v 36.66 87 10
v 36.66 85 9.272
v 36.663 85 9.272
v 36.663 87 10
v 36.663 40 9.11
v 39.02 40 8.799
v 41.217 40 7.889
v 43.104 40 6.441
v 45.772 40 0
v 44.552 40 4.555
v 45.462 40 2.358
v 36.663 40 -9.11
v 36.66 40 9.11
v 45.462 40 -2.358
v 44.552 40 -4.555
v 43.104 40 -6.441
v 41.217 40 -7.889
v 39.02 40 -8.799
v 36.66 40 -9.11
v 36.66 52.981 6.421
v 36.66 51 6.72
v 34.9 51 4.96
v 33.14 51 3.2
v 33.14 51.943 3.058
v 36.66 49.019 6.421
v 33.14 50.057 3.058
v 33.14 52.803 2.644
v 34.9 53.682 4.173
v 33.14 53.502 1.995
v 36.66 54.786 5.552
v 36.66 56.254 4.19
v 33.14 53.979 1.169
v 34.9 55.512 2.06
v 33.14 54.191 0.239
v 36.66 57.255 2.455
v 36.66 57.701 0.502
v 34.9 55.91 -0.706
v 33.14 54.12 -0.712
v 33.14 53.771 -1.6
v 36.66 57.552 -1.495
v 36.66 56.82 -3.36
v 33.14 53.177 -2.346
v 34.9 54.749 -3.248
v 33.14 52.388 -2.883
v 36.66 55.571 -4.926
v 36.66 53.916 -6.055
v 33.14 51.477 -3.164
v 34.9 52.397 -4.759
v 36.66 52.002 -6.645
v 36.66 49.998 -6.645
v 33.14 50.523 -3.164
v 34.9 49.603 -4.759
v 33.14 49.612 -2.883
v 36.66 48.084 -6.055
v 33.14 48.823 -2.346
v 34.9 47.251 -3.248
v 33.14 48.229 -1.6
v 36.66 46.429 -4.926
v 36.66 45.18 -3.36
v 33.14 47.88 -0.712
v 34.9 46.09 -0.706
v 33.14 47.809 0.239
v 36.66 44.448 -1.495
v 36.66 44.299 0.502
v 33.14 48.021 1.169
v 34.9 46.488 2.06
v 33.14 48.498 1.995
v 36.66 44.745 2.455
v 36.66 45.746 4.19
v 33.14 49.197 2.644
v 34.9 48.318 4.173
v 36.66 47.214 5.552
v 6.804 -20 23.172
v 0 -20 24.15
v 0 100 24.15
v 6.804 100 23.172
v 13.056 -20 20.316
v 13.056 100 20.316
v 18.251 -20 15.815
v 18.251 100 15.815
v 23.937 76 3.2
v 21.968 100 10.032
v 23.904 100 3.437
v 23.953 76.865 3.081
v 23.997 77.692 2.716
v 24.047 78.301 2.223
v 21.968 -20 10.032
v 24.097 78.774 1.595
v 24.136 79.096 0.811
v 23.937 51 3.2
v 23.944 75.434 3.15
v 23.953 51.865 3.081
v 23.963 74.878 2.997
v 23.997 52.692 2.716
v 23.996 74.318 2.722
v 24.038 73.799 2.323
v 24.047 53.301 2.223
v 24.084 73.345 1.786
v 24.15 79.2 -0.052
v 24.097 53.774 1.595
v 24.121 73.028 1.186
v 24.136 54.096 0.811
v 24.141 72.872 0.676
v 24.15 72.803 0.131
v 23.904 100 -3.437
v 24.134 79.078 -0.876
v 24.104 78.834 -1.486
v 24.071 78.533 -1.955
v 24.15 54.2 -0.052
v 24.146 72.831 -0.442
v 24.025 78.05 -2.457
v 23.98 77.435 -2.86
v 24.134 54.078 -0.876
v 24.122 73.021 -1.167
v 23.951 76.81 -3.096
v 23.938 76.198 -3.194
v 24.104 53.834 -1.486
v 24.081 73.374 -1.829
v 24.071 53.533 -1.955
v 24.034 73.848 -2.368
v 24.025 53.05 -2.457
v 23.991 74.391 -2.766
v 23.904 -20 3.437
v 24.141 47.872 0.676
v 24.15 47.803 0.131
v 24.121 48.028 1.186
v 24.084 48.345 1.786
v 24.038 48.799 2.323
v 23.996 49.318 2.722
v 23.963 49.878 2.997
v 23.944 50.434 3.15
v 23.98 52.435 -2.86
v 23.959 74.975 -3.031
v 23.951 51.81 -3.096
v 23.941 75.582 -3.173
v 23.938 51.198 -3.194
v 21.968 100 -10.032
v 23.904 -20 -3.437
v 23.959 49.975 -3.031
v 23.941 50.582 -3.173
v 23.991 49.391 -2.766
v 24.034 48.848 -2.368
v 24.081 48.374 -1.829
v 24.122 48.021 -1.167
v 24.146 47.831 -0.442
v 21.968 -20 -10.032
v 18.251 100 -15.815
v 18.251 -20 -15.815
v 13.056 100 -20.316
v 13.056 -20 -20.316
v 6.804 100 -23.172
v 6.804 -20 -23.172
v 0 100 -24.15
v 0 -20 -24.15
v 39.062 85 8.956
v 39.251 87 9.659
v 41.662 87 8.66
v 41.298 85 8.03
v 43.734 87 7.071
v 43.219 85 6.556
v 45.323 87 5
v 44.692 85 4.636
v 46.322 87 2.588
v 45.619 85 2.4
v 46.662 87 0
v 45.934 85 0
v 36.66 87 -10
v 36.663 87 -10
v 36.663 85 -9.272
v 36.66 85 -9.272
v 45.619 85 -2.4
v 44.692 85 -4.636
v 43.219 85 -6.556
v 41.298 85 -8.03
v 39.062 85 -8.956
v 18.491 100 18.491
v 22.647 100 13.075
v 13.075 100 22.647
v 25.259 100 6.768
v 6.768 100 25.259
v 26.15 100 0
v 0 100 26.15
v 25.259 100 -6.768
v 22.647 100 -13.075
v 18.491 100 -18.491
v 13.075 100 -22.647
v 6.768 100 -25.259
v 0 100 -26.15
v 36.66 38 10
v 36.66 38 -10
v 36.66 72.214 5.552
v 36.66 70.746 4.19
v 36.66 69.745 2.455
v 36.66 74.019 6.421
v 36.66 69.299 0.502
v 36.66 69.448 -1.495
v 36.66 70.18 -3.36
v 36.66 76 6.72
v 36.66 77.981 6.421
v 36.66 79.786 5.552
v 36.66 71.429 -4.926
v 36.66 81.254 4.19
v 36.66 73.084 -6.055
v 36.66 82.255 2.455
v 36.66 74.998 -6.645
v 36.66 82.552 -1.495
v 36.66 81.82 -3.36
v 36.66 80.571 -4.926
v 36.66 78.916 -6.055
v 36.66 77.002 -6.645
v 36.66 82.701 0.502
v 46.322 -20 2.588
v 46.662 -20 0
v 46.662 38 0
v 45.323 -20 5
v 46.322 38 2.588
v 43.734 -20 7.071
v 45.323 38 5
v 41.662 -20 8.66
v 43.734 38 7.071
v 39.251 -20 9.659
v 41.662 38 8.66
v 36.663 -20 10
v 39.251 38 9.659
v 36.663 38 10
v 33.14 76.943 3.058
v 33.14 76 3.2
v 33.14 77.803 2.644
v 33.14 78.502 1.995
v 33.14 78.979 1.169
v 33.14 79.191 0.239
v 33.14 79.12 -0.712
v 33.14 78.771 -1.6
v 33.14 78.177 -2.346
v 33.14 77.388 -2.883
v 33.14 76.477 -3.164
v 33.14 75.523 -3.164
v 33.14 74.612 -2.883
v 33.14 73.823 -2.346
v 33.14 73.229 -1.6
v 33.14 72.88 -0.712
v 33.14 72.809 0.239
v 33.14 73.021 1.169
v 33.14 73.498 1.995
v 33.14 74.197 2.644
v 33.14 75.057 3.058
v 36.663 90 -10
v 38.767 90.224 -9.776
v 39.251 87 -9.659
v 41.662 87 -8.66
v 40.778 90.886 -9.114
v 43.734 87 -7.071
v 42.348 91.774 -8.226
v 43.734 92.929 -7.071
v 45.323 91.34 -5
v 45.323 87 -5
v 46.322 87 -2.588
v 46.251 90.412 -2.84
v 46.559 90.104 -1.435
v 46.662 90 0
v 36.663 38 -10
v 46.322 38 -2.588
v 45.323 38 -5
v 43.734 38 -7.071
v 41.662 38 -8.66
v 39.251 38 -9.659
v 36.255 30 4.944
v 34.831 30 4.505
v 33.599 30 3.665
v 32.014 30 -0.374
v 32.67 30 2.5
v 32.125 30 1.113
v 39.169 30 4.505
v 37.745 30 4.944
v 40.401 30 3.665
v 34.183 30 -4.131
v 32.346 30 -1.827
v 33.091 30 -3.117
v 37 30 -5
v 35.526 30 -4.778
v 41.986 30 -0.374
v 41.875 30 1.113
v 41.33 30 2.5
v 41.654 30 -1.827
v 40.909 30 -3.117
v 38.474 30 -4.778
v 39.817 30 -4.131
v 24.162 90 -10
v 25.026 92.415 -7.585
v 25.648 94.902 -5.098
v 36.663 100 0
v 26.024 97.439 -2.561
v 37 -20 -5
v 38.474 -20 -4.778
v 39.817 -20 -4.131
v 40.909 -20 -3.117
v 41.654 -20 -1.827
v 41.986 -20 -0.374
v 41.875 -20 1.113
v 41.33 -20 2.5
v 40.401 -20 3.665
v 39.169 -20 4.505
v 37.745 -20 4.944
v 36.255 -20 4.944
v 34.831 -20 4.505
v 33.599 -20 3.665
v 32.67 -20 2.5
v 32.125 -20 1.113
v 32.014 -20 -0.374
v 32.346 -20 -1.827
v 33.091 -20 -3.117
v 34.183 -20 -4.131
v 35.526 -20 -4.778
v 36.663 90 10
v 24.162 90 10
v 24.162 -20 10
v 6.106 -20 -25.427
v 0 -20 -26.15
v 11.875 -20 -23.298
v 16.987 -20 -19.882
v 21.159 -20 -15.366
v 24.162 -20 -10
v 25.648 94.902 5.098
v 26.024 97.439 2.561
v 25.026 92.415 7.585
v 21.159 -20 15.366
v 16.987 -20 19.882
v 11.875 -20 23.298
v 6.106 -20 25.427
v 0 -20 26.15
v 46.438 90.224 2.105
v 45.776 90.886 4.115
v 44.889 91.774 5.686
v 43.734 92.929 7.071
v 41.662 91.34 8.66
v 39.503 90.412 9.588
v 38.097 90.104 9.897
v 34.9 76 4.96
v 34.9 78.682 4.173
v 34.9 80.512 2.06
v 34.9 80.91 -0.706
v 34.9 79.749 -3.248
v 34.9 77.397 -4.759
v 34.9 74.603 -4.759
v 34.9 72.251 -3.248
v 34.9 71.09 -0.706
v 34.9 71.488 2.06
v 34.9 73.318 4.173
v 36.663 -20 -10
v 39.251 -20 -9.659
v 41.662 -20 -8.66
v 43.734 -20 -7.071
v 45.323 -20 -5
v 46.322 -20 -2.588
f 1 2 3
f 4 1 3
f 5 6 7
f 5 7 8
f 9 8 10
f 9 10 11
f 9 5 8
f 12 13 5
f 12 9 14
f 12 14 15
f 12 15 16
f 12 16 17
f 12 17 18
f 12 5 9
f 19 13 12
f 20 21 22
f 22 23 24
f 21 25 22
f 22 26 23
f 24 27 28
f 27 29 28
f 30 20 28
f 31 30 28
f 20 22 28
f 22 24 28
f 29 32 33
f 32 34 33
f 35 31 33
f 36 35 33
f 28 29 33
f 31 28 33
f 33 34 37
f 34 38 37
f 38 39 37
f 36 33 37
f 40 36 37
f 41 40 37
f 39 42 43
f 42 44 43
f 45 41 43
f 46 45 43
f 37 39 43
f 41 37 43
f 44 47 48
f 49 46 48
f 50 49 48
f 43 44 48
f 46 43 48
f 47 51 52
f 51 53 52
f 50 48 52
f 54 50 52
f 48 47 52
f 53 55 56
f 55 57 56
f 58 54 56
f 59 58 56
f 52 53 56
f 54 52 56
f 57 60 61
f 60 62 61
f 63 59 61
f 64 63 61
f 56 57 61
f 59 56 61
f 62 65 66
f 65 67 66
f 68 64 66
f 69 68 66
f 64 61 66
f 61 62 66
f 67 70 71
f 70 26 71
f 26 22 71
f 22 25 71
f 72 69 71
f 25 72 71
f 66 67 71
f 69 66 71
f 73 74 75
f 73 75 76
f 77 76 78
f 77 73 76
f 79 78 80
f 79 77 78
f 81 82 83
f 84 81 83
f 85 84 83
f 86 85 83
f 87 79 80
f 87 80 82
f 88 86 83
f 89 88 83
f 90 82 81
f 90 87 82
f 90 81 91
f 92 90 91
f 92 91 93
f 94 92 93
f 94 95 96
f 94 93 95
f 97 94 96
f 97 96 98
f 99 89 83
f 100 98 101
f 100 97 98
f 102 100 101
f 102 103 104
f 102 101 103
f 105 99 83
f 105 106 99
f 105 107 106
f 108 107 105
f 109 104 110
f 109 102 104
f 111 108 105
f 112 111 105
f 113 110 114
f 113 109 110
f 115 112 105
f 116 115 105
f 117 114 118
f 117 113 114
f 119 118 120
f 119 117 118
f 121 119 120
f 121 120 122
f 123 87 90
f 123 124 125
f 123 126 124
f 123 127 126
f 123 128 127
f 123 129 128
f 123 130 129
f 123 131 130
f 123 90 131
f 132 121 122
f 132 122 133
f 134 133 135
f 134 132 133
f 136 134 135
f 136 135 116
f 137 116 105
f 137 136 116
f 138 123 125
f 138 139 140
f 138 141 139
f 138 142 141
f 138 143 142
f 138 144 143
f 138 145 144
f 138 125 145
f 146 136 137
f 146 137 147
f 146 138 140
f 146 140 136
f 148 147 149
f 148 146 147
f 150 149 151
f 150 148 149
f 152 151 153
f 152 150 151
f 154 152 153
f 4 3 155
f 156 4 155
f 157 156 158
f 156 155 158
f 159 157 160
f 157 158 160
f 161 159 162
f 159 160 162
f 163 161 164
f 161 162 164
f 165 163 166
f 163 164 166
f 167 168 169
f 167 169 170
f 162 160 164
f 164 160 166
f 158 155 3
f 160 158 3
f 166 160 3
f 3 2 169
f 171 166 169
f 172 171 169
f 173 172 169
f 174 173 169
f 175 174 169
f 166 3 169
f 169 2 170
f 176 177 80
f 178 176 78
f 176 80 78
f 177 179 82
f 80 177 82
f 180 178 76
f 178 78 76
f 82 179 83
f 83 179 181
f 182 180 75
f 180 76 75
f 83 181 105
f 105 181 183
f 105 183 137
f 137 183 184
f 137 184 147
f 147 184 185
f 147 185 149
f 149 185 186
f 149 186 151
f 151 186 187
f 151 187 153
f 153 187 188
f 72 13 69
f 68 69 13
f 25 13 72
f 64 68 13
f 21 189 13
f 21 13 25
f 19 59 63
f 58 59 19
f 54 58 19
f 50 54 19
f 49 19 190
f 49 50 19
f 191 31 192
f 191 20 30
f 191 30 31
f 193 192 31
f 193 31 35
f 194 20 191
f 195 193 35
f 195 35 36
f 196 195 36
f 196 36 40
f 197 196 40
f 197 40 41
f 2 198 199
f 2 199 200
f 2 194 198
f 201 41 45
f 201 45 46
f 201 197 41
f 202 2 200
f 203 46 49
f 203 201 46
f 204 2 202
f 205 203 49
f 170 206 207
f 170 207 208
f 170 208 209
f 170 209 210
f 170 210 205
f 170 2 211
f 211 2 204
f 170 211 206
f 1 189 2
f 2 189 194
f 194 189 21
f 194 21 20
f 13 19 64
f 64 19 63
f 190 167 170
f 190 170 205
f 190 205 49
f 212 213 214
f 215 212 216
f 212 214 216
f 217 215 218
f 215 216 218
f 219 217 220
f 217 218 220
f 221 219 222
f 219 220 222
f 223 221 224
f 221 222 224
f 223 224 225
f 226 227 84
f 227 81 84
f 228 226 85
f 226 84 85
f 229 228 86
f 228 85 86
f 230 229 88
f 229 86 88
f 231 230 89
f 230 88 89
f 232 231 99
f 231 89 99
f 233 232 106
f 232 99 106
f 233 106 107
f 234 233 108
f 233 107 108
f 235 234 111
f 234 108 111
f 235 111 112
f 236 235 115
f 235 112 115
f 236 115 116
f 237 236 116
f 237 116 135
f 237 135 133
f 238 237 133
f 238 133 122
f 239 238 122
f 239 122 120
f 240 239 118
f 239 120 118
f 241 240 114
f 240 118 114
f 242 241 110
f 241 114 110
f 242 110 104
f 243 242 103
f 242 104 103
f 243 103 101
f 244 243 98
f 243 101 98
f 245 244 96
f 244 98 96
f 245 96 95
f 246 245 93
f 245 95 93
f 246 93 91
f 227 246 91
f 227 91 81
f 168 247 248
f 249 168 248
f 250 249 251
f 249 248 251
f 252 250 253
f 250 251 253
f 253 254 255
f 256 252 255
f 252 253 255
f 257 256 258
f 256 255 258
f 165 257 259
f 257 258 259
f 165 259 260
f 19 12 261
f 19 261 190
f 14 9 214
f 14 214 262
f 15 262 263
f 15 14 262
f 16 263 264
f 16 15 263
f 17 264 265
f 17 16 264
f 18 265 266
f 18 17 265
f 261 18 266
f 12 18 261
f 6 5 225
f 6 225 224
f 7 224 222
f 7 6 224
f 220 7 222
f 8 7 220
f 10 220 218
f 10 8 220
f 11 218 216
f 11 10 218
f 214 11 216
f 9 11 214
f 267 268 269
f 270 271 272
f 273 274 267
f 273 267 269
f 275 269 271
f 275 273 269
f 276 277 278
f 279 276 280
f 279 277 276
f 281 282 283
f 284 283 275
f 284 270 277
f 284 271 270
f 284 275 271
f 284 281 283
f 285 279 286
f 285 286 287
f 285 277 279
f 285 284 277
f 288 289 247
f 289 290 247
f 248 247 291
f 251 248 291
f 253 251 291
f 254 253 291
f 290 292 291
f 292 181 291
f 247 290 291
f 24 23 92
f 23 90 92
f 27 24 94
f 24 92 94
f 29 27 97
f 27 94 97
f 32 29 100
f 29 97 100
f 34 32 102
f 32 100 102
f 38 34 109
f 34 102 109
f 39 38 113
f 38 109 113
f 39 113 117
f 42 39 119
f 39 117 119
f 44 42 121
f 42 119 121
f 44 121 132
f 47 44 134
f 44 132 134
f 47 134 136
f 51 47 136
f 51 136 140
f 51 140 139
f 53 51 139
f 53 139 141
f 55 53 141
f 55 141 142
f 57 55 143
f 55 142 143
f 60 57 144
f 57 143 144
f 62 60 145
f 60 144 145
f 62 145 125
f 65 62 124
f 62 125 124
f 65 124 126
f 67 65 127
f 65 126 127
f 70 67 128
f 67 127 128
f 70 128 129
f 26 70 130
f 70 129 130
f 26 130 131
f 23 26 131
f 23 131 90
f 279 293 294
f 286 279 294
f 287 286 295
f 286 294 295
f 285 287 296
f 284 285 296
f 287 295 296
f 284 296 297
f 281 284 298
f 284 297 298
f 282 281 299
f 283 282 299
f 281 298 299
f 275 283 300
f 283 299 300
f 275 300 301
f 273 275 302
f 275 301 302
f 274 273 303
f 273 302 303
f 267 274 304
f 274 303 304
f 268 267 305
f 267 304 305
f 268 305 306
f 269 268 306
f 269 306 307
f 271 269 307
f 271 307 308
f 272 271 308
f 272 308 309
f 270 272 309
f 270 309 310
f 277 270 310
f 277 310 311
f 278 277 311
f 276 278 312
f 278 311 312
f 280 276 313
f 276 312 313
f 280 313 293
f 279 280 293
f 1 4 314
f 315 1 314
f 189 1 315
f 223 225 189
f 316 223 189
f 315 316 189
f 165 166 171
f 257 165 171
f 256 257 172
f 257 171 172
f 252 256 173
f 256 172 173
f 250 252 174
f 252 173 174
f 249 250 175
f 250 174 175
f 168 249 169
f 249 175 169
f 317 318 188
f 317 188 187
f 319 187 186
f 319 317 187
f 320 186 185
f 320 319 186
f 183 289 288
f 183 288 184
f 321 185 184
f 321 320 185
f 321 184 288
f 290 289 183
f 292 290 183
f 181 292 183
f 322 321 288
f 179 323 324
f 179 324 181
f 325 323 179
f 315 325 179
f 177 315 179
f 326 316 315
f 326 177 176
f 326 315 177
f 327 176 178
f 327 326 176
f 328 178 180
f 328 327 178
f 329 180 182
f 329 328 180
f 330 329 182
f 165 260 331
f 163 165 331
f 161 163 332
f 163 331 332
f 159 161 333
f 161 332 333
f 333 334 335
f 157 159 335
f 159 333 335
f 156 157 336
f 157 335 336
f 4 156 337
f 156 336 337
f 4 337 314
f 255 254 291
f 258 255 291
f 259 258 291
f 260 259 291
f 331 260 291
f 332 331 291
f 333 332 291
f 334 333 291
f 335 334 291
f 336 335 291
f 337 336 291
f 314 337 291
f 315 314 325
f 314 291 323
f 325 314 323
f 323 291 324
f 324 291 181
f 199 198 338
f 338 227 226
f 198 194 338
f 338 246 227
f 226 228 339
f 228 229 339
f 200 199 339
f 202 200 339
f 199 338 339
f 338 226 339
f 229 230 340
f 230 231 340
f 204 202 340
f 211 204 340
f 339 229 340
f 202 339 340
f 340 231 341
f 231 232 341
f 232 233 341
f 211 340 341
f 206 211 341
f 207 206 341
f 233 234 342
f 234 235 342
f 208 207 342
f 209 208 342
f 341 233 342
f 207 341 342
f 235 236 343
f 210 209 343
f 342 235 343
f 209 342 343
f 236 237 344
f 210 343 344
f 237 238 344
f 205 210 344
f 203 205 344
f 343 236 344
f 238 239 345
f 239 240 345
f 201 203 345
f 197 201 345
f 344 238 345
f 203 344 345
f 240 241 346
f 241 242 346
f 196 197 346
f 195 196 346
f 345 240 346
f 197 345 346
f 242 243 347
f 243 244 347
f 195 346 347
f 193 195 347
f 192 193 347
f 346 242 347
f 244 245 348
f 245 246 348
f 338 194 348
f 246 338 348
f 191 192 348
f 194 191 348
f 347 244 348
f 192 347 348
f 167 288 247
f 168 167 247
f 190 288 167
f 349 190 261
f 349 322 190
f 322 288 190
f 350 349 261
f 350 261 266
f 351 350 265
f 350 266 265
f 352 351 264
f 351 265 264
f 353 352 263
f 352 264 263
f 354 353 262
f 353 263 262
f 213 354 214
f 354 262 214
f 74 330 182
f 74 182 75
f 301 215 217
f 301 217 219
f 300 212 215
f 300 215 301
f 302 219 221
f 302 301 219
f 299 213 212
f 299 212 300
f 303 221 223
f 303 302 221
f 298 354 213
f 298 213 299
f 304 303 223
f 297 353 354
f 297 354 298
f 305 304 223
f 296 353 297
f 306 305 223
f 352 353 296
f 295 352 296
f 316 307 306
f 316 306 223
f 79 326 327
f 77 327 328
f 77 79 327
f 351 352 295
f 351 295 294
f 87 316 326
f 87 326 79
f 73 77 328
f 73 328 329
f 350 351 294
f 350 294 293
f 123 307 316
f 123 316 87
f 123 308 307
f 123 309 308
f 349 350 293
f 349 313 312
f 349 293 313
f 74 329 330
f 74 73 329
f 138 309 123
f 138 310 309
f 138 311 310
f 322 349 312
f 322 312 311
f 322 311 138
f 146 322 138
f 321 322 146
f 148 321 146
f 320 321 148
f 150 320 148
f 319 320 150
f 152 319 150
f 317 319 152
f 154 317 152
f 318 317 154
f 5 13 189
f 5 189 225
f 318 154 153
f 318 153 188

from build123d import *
from OCP.BRepFilletAPI import BRepFilletAPI_MakeChamfer

# Parameters (mm, degrees)
DODANIE_WYCI_GNI_CIE1_DEPTH                        = 100
DODANIE_WYCI_GNI_CIE1_DEPTH_BACK                   = 20
SFAZOWANIE1_SIZE                                   = 10
ZAOKR_GLENIE1_R                                    = 10
SZKIC3_W                                           = 20
SZKIC3_H                                           = 45
WYTNIJ_WYCI_GNI_CIE1_DEPTH                         = 100
SFAZOWANIE2_SIZE                                   = 2
SFAZOWANIE2_SIZE2                                  = 0.890457371
SFAZOWANIE3_SIZE                                   = 2
SFAZOWANIE3_SIZE2                                  = 0.727940469
POG_BIENIE_STO_KOWE_POD_M6_WKR_T_Z_BEM_D           = 6.4
POG_BIENIE_STO_KOWE_POD_M6_WKR_T_Z_BEM_DEPTH       = 40
POG_BIENIE_STO_KOWE_POD_M6_WKR_T_Z_BEM_CSINK_D     = 13.44
POG_BIENIE_STO_KOWE_POD_M6_WKR_T_Z_BEM_CSINK_ANGLE = 90
POG_BIENIE_STO_KOWE_POD_M6_WKR_T_Z_BEM_TIP         = 1.922753981
SZKIC7_R                                           = 5
WYTNIJ_WYCI_GNI_CIE2_DEPTH                         = 50


with BuildPart() as part:
    # Szkic2 → Dodanie-wyciągnięcie1 (new, two sides: drawn at the far end of the back side and taken through both)
    with BuildSketch(Plane(origin=(0, 0, 0), x_dir=(1, 0, 0), z_dir=(0, 1, 0)).offset(-DODANIE_WYCI_GNI_CIE1_DEPTH_BACK)):
        with BuildLine():
            Line((24.162419167, 10), (46.662419167, 10))
            Line((46.662419167, 10), (46.662419167, -10))
            Line((46.662419167, -10), (24.162419167, -10))
            ThreePointArc((24.162419167, -10), (14.53138844, -21.740773905), (0, -26.15))
            Line((0, -26.15), (0, -24.15))
            ThreePointArc((0, -24.15), (24.15, 0), (0, 24.15))
            Line((0, 24.15), (0, 26.15))
            ThreePointArc((0, 26.15), (14.53138844, 21.740773905), (24.162419167, 10))
        make_face()
    extrude(amount=DODANIE_WYCI_GNI_CIE1_DEPTH + DODANIE_WYCI_GNI_CIE1_DEPTH_BACK)

    # Sfazowanie1
    sfazowanie1_edges = [part.edges().sort_by_distance(p)[0] for p in [
        (35.412419167, 100, 10),
        (46.662419167, 100, 0),
        (35.412419167, 100, -10),
    ]]
    chamfer(sfazowanie1_edges, length=SFAZOWANIE1_SIZE - 0.0001)  # a hair under: the kernel refuses the full size

    # Zaokrąglenie1
    zaokr_glenie1_edges = [part.edges().sort_by_distance(p)[0] for p in [
        (46.662419167, 35.00005, -10),
        (46.662419167, 35.00005, 10),
    ]]
    fillet(zaokr_glenie1_edges, radius=ZAOKR_GLENIE1_R - 0.0001)  # a hair under: the kernel refuses the full size

    # Szkic3 → Wytnij-wyciągnięcie1 (cut)
    with BuildSketch(Plane(origin=(36.66, 0, 0), x_dir=(0, 0, -1), z_dir=(1, 0, 0))):
        with Locations((0, 62.5)):
            Rectangle(SZKIC3_W, SZKIC3_H)
    extrude(amount=WYTNIJ_WYCI_GNI_CIE1_DEPTH, mode=Mode.SUBTRACT)

    # Sfazowanie2: one chamfer whose edges measure the first distance from different faces: ONE call of the kernel's chamfer builder (chamfer() names one face for all edges)
    sfazowanie2_edges_1 = [part.edges().sort_by_distance(p)[0] for p in [
        (43.733516268, 40, -7.071097101),
    ]]
    sfazowanie2_side_1 = [part.faces().sort_by_distance(p)[0] for p in [
        (43.733516268, 10, -7.071097101),
    ]]
    sfazowanie2_edges_2 = [part.edges().sort_by_distance(p)[0] for p in [
        (43.733516268, 40, 7.071097101),
    ]]
    sfazowanie2_side_2 = [part.faces().sort_by_distance(p)[0] for p in [
        (43.733516268, 10, 7.071097101),
    ]]
    sfazowanie2_edges_3 = [part.edges().sort_by_distance(p)[0] for p in [
        (36.661259583, 40, -10),
    ]]
    sfazowanie2_side_3 = [part.faces().sort_by_distance(p)[0] for p in [
        (30.411953945, 34.997782587, -10),
    ]]
    sfazowanie2_edges_4 = [part.edges().sort_by_distance(p)[0] for p in [
        (36.661259583, 40, 10),
    ]]
    sfazowanie2_side_4 = [part.faces().sort_by_distance(p)[0] for p in [
        (30.411953945, 34.997782587, 10),
    ]]
    sfazowanie2 = BRepFilletAPI_MakeChamfer(part.part.solid().wrapped)
    for e in sfazowanie2_edges_1:
        sfazowanie2.Add(SFAZOWANIE2_SIZE, SFAZOWANIE2_SIZE2, e.wrapped, sfazowanie2_side_1[0].wrapped)  # the first distance lies on this face
    for e in sfazowanie2_edges_2:
        sfazowanie2.Add(SFAZOWANIE2_SIZE, SFAZOWANIE2_SIZE2, e.wrapped, sfazowanie2_side_2[0].wrapped)  # the first distance lies on this face
    for e in sfazowanie2_edges_3:
        sfazowanie2.Add(SFAZOWANIE2_SIZE, SFAZOWANIE2_SIZE2, e.wrapped, sfazowanie2_side_3[0].wrapped)  # the first distance lies on this face
    for e in sfazowanie2_edges_4:
        sfazowanie2.Add(SFAZOWANIE2_SIZE, SFAZOWANIE2_SIZE2, e.wrapped, sfazowanie2_side_4[0].wrapped)  # the first distance lies on this face
    add(Compound.cast(sfazowanie2.Shape()), mode=Mode.REPLACE)

    # Sfazowanie3: one chamfer whose edges measure the first distance from different faces: ONE call of the kernel's chamfer builder (chamfer() names one face for all edges)
    sfazowanie3_edges_1 = [part.edges().sort_by_distance(p)[0] for p in [
        (43.733516268, 85, -7.071097101),
    ]]
    sfazowanie3_side_1 = [part.faces().sort_by_distance(p)[0] for p in [
        (43.733516268, 88.964501449, -7.071097101),
    ]]
    sfazowanie3_edges_2 = [part.edges().sort_by_distance(p)[0] for p in [
        (43.733516268, 85, 7.071097101),
    ]]
    sfazowanie3_side_2 = [part.faces().sort_by_distance(p)[0] for p in [
        (43.733516268, 88.964501449, 7.071097101),
    ]]
    sfazowanie3_edges_3 = [part.edges().sort_by_distance(p)[0] for p in [
        (36.661259583, 85, -10),
    ]]
    sfazowanie3_side_3 = [part.faces().sort_by_distance(p)[0] for p in [
        (30.411931044, 34.997767921, -10),
    ]]
    sfazowanie3_edges_4 = [part.edges().sort_by_distance(p)[0] for p in [
        (36.661259583, 85, 10),
    ]]
    sfazowanie3_side_4 = [part.faces().sort_by_distance(p)[0] for p in [
        (30.411931044, 34.997767921, 10),
    ]]
    sfazowanie3 = BRepFilletAPI_MakeChamfer(part.part.solid().wrapped)
    for e in sfazowanie3_edges_1:
        sfazowanie3.Add(SFAZOWANIE3_SIZE, SFAZOWANIE3_SIZE2, e.wrapped, sfazowanie3_side_1[0].wrapped)  # the first distance lies on this face
    for e in sfazowanie3_edges_2:
        sfazowanie3.Add(SFAZOWANIE3_SIZE, SFAZOWANIE3_SIZE2, e.wrapped, sfazowanie3_side_2[0].wrapped)  # the first distance lies on this face
    for e in sfazowanie3_edges_3:
        sfazowanie3.Add(SFAZOWANIE3_SIZE, SFAZOWANIE3_SIZE2, e.wrapped, sfazowanie3_side_3[0].wrapped)  # the first distance lies on this face
    for e in sfazowanie3_edges_4:
        sfazowanie3.Add(SFAZOWANIE3_SIZE, SFAZOWANIE3_SIZE2, e.wrapped, sfazowanie3_side_4[0].wrapped)  # the first distance lies on this face
    add(Compound.cast(sfazowanie3.Shape()), mode=Mode.REPLACE)

    # Pogłębienie stożkowe pod M6 Wkręt z łbem stożkowym płaskim2
    with Locations(Plane(origin=(36.66, 0, 0), x_dir=(0, 0, -1), z_dir=(1, 0, 0))):
        with Locations((0, 51), (0, 76)):
            CounterSinkHole(POG_BIENIE_STO_KOWE_POD_M6_WKR_T_Z_BEM_D / 2, POG_BIENIE_STO_KOWE_POD_M6_WKR_T_Z_BEM_CSINK_D / 2, depth=POG_BIENIE_STO_KOWE_POD_M6_WKR_T_Z_BEM_DEPTH, counter_sink_angle=POG_BIENIE_STO_KOWE_POD_M6_WKR_T_Z_BEM_CSINK_ANGLE)
            with Locations((0, 0, -(POG_BIENIE_STO_KOWE_POD_M6_WKR_T_Z_BEM_DEPTH + POG_BIENIE_STO_KOWE_POD_M6_WKR_T_Z_BEM_TIP / 2))):  # 118° drill point
                Cone(0, POG_BIENIE_STO_KOWE_POD_M6_WKR_T_Z_BEM_D / 2, POG_BIENIE_STO_KOWE_POD_M6_WKR_T_Z_BEM_TIP, mode=Mode.SUBTRACT)

    # Szkic7 → Wytnij-wyciągnięcie2 (cut)
    with BuildSketch(Plane.XZ.offset(20)):
        with Locations(Location((37, 0, 0), (0, 0, 270))):
            Circle(SZKIC7_R)
    extrude(amount=-WYTNIJ_WYCI_GNI_CIE2_DEPTH, mode=Mode.SUBTRACT)


solid = part.part
